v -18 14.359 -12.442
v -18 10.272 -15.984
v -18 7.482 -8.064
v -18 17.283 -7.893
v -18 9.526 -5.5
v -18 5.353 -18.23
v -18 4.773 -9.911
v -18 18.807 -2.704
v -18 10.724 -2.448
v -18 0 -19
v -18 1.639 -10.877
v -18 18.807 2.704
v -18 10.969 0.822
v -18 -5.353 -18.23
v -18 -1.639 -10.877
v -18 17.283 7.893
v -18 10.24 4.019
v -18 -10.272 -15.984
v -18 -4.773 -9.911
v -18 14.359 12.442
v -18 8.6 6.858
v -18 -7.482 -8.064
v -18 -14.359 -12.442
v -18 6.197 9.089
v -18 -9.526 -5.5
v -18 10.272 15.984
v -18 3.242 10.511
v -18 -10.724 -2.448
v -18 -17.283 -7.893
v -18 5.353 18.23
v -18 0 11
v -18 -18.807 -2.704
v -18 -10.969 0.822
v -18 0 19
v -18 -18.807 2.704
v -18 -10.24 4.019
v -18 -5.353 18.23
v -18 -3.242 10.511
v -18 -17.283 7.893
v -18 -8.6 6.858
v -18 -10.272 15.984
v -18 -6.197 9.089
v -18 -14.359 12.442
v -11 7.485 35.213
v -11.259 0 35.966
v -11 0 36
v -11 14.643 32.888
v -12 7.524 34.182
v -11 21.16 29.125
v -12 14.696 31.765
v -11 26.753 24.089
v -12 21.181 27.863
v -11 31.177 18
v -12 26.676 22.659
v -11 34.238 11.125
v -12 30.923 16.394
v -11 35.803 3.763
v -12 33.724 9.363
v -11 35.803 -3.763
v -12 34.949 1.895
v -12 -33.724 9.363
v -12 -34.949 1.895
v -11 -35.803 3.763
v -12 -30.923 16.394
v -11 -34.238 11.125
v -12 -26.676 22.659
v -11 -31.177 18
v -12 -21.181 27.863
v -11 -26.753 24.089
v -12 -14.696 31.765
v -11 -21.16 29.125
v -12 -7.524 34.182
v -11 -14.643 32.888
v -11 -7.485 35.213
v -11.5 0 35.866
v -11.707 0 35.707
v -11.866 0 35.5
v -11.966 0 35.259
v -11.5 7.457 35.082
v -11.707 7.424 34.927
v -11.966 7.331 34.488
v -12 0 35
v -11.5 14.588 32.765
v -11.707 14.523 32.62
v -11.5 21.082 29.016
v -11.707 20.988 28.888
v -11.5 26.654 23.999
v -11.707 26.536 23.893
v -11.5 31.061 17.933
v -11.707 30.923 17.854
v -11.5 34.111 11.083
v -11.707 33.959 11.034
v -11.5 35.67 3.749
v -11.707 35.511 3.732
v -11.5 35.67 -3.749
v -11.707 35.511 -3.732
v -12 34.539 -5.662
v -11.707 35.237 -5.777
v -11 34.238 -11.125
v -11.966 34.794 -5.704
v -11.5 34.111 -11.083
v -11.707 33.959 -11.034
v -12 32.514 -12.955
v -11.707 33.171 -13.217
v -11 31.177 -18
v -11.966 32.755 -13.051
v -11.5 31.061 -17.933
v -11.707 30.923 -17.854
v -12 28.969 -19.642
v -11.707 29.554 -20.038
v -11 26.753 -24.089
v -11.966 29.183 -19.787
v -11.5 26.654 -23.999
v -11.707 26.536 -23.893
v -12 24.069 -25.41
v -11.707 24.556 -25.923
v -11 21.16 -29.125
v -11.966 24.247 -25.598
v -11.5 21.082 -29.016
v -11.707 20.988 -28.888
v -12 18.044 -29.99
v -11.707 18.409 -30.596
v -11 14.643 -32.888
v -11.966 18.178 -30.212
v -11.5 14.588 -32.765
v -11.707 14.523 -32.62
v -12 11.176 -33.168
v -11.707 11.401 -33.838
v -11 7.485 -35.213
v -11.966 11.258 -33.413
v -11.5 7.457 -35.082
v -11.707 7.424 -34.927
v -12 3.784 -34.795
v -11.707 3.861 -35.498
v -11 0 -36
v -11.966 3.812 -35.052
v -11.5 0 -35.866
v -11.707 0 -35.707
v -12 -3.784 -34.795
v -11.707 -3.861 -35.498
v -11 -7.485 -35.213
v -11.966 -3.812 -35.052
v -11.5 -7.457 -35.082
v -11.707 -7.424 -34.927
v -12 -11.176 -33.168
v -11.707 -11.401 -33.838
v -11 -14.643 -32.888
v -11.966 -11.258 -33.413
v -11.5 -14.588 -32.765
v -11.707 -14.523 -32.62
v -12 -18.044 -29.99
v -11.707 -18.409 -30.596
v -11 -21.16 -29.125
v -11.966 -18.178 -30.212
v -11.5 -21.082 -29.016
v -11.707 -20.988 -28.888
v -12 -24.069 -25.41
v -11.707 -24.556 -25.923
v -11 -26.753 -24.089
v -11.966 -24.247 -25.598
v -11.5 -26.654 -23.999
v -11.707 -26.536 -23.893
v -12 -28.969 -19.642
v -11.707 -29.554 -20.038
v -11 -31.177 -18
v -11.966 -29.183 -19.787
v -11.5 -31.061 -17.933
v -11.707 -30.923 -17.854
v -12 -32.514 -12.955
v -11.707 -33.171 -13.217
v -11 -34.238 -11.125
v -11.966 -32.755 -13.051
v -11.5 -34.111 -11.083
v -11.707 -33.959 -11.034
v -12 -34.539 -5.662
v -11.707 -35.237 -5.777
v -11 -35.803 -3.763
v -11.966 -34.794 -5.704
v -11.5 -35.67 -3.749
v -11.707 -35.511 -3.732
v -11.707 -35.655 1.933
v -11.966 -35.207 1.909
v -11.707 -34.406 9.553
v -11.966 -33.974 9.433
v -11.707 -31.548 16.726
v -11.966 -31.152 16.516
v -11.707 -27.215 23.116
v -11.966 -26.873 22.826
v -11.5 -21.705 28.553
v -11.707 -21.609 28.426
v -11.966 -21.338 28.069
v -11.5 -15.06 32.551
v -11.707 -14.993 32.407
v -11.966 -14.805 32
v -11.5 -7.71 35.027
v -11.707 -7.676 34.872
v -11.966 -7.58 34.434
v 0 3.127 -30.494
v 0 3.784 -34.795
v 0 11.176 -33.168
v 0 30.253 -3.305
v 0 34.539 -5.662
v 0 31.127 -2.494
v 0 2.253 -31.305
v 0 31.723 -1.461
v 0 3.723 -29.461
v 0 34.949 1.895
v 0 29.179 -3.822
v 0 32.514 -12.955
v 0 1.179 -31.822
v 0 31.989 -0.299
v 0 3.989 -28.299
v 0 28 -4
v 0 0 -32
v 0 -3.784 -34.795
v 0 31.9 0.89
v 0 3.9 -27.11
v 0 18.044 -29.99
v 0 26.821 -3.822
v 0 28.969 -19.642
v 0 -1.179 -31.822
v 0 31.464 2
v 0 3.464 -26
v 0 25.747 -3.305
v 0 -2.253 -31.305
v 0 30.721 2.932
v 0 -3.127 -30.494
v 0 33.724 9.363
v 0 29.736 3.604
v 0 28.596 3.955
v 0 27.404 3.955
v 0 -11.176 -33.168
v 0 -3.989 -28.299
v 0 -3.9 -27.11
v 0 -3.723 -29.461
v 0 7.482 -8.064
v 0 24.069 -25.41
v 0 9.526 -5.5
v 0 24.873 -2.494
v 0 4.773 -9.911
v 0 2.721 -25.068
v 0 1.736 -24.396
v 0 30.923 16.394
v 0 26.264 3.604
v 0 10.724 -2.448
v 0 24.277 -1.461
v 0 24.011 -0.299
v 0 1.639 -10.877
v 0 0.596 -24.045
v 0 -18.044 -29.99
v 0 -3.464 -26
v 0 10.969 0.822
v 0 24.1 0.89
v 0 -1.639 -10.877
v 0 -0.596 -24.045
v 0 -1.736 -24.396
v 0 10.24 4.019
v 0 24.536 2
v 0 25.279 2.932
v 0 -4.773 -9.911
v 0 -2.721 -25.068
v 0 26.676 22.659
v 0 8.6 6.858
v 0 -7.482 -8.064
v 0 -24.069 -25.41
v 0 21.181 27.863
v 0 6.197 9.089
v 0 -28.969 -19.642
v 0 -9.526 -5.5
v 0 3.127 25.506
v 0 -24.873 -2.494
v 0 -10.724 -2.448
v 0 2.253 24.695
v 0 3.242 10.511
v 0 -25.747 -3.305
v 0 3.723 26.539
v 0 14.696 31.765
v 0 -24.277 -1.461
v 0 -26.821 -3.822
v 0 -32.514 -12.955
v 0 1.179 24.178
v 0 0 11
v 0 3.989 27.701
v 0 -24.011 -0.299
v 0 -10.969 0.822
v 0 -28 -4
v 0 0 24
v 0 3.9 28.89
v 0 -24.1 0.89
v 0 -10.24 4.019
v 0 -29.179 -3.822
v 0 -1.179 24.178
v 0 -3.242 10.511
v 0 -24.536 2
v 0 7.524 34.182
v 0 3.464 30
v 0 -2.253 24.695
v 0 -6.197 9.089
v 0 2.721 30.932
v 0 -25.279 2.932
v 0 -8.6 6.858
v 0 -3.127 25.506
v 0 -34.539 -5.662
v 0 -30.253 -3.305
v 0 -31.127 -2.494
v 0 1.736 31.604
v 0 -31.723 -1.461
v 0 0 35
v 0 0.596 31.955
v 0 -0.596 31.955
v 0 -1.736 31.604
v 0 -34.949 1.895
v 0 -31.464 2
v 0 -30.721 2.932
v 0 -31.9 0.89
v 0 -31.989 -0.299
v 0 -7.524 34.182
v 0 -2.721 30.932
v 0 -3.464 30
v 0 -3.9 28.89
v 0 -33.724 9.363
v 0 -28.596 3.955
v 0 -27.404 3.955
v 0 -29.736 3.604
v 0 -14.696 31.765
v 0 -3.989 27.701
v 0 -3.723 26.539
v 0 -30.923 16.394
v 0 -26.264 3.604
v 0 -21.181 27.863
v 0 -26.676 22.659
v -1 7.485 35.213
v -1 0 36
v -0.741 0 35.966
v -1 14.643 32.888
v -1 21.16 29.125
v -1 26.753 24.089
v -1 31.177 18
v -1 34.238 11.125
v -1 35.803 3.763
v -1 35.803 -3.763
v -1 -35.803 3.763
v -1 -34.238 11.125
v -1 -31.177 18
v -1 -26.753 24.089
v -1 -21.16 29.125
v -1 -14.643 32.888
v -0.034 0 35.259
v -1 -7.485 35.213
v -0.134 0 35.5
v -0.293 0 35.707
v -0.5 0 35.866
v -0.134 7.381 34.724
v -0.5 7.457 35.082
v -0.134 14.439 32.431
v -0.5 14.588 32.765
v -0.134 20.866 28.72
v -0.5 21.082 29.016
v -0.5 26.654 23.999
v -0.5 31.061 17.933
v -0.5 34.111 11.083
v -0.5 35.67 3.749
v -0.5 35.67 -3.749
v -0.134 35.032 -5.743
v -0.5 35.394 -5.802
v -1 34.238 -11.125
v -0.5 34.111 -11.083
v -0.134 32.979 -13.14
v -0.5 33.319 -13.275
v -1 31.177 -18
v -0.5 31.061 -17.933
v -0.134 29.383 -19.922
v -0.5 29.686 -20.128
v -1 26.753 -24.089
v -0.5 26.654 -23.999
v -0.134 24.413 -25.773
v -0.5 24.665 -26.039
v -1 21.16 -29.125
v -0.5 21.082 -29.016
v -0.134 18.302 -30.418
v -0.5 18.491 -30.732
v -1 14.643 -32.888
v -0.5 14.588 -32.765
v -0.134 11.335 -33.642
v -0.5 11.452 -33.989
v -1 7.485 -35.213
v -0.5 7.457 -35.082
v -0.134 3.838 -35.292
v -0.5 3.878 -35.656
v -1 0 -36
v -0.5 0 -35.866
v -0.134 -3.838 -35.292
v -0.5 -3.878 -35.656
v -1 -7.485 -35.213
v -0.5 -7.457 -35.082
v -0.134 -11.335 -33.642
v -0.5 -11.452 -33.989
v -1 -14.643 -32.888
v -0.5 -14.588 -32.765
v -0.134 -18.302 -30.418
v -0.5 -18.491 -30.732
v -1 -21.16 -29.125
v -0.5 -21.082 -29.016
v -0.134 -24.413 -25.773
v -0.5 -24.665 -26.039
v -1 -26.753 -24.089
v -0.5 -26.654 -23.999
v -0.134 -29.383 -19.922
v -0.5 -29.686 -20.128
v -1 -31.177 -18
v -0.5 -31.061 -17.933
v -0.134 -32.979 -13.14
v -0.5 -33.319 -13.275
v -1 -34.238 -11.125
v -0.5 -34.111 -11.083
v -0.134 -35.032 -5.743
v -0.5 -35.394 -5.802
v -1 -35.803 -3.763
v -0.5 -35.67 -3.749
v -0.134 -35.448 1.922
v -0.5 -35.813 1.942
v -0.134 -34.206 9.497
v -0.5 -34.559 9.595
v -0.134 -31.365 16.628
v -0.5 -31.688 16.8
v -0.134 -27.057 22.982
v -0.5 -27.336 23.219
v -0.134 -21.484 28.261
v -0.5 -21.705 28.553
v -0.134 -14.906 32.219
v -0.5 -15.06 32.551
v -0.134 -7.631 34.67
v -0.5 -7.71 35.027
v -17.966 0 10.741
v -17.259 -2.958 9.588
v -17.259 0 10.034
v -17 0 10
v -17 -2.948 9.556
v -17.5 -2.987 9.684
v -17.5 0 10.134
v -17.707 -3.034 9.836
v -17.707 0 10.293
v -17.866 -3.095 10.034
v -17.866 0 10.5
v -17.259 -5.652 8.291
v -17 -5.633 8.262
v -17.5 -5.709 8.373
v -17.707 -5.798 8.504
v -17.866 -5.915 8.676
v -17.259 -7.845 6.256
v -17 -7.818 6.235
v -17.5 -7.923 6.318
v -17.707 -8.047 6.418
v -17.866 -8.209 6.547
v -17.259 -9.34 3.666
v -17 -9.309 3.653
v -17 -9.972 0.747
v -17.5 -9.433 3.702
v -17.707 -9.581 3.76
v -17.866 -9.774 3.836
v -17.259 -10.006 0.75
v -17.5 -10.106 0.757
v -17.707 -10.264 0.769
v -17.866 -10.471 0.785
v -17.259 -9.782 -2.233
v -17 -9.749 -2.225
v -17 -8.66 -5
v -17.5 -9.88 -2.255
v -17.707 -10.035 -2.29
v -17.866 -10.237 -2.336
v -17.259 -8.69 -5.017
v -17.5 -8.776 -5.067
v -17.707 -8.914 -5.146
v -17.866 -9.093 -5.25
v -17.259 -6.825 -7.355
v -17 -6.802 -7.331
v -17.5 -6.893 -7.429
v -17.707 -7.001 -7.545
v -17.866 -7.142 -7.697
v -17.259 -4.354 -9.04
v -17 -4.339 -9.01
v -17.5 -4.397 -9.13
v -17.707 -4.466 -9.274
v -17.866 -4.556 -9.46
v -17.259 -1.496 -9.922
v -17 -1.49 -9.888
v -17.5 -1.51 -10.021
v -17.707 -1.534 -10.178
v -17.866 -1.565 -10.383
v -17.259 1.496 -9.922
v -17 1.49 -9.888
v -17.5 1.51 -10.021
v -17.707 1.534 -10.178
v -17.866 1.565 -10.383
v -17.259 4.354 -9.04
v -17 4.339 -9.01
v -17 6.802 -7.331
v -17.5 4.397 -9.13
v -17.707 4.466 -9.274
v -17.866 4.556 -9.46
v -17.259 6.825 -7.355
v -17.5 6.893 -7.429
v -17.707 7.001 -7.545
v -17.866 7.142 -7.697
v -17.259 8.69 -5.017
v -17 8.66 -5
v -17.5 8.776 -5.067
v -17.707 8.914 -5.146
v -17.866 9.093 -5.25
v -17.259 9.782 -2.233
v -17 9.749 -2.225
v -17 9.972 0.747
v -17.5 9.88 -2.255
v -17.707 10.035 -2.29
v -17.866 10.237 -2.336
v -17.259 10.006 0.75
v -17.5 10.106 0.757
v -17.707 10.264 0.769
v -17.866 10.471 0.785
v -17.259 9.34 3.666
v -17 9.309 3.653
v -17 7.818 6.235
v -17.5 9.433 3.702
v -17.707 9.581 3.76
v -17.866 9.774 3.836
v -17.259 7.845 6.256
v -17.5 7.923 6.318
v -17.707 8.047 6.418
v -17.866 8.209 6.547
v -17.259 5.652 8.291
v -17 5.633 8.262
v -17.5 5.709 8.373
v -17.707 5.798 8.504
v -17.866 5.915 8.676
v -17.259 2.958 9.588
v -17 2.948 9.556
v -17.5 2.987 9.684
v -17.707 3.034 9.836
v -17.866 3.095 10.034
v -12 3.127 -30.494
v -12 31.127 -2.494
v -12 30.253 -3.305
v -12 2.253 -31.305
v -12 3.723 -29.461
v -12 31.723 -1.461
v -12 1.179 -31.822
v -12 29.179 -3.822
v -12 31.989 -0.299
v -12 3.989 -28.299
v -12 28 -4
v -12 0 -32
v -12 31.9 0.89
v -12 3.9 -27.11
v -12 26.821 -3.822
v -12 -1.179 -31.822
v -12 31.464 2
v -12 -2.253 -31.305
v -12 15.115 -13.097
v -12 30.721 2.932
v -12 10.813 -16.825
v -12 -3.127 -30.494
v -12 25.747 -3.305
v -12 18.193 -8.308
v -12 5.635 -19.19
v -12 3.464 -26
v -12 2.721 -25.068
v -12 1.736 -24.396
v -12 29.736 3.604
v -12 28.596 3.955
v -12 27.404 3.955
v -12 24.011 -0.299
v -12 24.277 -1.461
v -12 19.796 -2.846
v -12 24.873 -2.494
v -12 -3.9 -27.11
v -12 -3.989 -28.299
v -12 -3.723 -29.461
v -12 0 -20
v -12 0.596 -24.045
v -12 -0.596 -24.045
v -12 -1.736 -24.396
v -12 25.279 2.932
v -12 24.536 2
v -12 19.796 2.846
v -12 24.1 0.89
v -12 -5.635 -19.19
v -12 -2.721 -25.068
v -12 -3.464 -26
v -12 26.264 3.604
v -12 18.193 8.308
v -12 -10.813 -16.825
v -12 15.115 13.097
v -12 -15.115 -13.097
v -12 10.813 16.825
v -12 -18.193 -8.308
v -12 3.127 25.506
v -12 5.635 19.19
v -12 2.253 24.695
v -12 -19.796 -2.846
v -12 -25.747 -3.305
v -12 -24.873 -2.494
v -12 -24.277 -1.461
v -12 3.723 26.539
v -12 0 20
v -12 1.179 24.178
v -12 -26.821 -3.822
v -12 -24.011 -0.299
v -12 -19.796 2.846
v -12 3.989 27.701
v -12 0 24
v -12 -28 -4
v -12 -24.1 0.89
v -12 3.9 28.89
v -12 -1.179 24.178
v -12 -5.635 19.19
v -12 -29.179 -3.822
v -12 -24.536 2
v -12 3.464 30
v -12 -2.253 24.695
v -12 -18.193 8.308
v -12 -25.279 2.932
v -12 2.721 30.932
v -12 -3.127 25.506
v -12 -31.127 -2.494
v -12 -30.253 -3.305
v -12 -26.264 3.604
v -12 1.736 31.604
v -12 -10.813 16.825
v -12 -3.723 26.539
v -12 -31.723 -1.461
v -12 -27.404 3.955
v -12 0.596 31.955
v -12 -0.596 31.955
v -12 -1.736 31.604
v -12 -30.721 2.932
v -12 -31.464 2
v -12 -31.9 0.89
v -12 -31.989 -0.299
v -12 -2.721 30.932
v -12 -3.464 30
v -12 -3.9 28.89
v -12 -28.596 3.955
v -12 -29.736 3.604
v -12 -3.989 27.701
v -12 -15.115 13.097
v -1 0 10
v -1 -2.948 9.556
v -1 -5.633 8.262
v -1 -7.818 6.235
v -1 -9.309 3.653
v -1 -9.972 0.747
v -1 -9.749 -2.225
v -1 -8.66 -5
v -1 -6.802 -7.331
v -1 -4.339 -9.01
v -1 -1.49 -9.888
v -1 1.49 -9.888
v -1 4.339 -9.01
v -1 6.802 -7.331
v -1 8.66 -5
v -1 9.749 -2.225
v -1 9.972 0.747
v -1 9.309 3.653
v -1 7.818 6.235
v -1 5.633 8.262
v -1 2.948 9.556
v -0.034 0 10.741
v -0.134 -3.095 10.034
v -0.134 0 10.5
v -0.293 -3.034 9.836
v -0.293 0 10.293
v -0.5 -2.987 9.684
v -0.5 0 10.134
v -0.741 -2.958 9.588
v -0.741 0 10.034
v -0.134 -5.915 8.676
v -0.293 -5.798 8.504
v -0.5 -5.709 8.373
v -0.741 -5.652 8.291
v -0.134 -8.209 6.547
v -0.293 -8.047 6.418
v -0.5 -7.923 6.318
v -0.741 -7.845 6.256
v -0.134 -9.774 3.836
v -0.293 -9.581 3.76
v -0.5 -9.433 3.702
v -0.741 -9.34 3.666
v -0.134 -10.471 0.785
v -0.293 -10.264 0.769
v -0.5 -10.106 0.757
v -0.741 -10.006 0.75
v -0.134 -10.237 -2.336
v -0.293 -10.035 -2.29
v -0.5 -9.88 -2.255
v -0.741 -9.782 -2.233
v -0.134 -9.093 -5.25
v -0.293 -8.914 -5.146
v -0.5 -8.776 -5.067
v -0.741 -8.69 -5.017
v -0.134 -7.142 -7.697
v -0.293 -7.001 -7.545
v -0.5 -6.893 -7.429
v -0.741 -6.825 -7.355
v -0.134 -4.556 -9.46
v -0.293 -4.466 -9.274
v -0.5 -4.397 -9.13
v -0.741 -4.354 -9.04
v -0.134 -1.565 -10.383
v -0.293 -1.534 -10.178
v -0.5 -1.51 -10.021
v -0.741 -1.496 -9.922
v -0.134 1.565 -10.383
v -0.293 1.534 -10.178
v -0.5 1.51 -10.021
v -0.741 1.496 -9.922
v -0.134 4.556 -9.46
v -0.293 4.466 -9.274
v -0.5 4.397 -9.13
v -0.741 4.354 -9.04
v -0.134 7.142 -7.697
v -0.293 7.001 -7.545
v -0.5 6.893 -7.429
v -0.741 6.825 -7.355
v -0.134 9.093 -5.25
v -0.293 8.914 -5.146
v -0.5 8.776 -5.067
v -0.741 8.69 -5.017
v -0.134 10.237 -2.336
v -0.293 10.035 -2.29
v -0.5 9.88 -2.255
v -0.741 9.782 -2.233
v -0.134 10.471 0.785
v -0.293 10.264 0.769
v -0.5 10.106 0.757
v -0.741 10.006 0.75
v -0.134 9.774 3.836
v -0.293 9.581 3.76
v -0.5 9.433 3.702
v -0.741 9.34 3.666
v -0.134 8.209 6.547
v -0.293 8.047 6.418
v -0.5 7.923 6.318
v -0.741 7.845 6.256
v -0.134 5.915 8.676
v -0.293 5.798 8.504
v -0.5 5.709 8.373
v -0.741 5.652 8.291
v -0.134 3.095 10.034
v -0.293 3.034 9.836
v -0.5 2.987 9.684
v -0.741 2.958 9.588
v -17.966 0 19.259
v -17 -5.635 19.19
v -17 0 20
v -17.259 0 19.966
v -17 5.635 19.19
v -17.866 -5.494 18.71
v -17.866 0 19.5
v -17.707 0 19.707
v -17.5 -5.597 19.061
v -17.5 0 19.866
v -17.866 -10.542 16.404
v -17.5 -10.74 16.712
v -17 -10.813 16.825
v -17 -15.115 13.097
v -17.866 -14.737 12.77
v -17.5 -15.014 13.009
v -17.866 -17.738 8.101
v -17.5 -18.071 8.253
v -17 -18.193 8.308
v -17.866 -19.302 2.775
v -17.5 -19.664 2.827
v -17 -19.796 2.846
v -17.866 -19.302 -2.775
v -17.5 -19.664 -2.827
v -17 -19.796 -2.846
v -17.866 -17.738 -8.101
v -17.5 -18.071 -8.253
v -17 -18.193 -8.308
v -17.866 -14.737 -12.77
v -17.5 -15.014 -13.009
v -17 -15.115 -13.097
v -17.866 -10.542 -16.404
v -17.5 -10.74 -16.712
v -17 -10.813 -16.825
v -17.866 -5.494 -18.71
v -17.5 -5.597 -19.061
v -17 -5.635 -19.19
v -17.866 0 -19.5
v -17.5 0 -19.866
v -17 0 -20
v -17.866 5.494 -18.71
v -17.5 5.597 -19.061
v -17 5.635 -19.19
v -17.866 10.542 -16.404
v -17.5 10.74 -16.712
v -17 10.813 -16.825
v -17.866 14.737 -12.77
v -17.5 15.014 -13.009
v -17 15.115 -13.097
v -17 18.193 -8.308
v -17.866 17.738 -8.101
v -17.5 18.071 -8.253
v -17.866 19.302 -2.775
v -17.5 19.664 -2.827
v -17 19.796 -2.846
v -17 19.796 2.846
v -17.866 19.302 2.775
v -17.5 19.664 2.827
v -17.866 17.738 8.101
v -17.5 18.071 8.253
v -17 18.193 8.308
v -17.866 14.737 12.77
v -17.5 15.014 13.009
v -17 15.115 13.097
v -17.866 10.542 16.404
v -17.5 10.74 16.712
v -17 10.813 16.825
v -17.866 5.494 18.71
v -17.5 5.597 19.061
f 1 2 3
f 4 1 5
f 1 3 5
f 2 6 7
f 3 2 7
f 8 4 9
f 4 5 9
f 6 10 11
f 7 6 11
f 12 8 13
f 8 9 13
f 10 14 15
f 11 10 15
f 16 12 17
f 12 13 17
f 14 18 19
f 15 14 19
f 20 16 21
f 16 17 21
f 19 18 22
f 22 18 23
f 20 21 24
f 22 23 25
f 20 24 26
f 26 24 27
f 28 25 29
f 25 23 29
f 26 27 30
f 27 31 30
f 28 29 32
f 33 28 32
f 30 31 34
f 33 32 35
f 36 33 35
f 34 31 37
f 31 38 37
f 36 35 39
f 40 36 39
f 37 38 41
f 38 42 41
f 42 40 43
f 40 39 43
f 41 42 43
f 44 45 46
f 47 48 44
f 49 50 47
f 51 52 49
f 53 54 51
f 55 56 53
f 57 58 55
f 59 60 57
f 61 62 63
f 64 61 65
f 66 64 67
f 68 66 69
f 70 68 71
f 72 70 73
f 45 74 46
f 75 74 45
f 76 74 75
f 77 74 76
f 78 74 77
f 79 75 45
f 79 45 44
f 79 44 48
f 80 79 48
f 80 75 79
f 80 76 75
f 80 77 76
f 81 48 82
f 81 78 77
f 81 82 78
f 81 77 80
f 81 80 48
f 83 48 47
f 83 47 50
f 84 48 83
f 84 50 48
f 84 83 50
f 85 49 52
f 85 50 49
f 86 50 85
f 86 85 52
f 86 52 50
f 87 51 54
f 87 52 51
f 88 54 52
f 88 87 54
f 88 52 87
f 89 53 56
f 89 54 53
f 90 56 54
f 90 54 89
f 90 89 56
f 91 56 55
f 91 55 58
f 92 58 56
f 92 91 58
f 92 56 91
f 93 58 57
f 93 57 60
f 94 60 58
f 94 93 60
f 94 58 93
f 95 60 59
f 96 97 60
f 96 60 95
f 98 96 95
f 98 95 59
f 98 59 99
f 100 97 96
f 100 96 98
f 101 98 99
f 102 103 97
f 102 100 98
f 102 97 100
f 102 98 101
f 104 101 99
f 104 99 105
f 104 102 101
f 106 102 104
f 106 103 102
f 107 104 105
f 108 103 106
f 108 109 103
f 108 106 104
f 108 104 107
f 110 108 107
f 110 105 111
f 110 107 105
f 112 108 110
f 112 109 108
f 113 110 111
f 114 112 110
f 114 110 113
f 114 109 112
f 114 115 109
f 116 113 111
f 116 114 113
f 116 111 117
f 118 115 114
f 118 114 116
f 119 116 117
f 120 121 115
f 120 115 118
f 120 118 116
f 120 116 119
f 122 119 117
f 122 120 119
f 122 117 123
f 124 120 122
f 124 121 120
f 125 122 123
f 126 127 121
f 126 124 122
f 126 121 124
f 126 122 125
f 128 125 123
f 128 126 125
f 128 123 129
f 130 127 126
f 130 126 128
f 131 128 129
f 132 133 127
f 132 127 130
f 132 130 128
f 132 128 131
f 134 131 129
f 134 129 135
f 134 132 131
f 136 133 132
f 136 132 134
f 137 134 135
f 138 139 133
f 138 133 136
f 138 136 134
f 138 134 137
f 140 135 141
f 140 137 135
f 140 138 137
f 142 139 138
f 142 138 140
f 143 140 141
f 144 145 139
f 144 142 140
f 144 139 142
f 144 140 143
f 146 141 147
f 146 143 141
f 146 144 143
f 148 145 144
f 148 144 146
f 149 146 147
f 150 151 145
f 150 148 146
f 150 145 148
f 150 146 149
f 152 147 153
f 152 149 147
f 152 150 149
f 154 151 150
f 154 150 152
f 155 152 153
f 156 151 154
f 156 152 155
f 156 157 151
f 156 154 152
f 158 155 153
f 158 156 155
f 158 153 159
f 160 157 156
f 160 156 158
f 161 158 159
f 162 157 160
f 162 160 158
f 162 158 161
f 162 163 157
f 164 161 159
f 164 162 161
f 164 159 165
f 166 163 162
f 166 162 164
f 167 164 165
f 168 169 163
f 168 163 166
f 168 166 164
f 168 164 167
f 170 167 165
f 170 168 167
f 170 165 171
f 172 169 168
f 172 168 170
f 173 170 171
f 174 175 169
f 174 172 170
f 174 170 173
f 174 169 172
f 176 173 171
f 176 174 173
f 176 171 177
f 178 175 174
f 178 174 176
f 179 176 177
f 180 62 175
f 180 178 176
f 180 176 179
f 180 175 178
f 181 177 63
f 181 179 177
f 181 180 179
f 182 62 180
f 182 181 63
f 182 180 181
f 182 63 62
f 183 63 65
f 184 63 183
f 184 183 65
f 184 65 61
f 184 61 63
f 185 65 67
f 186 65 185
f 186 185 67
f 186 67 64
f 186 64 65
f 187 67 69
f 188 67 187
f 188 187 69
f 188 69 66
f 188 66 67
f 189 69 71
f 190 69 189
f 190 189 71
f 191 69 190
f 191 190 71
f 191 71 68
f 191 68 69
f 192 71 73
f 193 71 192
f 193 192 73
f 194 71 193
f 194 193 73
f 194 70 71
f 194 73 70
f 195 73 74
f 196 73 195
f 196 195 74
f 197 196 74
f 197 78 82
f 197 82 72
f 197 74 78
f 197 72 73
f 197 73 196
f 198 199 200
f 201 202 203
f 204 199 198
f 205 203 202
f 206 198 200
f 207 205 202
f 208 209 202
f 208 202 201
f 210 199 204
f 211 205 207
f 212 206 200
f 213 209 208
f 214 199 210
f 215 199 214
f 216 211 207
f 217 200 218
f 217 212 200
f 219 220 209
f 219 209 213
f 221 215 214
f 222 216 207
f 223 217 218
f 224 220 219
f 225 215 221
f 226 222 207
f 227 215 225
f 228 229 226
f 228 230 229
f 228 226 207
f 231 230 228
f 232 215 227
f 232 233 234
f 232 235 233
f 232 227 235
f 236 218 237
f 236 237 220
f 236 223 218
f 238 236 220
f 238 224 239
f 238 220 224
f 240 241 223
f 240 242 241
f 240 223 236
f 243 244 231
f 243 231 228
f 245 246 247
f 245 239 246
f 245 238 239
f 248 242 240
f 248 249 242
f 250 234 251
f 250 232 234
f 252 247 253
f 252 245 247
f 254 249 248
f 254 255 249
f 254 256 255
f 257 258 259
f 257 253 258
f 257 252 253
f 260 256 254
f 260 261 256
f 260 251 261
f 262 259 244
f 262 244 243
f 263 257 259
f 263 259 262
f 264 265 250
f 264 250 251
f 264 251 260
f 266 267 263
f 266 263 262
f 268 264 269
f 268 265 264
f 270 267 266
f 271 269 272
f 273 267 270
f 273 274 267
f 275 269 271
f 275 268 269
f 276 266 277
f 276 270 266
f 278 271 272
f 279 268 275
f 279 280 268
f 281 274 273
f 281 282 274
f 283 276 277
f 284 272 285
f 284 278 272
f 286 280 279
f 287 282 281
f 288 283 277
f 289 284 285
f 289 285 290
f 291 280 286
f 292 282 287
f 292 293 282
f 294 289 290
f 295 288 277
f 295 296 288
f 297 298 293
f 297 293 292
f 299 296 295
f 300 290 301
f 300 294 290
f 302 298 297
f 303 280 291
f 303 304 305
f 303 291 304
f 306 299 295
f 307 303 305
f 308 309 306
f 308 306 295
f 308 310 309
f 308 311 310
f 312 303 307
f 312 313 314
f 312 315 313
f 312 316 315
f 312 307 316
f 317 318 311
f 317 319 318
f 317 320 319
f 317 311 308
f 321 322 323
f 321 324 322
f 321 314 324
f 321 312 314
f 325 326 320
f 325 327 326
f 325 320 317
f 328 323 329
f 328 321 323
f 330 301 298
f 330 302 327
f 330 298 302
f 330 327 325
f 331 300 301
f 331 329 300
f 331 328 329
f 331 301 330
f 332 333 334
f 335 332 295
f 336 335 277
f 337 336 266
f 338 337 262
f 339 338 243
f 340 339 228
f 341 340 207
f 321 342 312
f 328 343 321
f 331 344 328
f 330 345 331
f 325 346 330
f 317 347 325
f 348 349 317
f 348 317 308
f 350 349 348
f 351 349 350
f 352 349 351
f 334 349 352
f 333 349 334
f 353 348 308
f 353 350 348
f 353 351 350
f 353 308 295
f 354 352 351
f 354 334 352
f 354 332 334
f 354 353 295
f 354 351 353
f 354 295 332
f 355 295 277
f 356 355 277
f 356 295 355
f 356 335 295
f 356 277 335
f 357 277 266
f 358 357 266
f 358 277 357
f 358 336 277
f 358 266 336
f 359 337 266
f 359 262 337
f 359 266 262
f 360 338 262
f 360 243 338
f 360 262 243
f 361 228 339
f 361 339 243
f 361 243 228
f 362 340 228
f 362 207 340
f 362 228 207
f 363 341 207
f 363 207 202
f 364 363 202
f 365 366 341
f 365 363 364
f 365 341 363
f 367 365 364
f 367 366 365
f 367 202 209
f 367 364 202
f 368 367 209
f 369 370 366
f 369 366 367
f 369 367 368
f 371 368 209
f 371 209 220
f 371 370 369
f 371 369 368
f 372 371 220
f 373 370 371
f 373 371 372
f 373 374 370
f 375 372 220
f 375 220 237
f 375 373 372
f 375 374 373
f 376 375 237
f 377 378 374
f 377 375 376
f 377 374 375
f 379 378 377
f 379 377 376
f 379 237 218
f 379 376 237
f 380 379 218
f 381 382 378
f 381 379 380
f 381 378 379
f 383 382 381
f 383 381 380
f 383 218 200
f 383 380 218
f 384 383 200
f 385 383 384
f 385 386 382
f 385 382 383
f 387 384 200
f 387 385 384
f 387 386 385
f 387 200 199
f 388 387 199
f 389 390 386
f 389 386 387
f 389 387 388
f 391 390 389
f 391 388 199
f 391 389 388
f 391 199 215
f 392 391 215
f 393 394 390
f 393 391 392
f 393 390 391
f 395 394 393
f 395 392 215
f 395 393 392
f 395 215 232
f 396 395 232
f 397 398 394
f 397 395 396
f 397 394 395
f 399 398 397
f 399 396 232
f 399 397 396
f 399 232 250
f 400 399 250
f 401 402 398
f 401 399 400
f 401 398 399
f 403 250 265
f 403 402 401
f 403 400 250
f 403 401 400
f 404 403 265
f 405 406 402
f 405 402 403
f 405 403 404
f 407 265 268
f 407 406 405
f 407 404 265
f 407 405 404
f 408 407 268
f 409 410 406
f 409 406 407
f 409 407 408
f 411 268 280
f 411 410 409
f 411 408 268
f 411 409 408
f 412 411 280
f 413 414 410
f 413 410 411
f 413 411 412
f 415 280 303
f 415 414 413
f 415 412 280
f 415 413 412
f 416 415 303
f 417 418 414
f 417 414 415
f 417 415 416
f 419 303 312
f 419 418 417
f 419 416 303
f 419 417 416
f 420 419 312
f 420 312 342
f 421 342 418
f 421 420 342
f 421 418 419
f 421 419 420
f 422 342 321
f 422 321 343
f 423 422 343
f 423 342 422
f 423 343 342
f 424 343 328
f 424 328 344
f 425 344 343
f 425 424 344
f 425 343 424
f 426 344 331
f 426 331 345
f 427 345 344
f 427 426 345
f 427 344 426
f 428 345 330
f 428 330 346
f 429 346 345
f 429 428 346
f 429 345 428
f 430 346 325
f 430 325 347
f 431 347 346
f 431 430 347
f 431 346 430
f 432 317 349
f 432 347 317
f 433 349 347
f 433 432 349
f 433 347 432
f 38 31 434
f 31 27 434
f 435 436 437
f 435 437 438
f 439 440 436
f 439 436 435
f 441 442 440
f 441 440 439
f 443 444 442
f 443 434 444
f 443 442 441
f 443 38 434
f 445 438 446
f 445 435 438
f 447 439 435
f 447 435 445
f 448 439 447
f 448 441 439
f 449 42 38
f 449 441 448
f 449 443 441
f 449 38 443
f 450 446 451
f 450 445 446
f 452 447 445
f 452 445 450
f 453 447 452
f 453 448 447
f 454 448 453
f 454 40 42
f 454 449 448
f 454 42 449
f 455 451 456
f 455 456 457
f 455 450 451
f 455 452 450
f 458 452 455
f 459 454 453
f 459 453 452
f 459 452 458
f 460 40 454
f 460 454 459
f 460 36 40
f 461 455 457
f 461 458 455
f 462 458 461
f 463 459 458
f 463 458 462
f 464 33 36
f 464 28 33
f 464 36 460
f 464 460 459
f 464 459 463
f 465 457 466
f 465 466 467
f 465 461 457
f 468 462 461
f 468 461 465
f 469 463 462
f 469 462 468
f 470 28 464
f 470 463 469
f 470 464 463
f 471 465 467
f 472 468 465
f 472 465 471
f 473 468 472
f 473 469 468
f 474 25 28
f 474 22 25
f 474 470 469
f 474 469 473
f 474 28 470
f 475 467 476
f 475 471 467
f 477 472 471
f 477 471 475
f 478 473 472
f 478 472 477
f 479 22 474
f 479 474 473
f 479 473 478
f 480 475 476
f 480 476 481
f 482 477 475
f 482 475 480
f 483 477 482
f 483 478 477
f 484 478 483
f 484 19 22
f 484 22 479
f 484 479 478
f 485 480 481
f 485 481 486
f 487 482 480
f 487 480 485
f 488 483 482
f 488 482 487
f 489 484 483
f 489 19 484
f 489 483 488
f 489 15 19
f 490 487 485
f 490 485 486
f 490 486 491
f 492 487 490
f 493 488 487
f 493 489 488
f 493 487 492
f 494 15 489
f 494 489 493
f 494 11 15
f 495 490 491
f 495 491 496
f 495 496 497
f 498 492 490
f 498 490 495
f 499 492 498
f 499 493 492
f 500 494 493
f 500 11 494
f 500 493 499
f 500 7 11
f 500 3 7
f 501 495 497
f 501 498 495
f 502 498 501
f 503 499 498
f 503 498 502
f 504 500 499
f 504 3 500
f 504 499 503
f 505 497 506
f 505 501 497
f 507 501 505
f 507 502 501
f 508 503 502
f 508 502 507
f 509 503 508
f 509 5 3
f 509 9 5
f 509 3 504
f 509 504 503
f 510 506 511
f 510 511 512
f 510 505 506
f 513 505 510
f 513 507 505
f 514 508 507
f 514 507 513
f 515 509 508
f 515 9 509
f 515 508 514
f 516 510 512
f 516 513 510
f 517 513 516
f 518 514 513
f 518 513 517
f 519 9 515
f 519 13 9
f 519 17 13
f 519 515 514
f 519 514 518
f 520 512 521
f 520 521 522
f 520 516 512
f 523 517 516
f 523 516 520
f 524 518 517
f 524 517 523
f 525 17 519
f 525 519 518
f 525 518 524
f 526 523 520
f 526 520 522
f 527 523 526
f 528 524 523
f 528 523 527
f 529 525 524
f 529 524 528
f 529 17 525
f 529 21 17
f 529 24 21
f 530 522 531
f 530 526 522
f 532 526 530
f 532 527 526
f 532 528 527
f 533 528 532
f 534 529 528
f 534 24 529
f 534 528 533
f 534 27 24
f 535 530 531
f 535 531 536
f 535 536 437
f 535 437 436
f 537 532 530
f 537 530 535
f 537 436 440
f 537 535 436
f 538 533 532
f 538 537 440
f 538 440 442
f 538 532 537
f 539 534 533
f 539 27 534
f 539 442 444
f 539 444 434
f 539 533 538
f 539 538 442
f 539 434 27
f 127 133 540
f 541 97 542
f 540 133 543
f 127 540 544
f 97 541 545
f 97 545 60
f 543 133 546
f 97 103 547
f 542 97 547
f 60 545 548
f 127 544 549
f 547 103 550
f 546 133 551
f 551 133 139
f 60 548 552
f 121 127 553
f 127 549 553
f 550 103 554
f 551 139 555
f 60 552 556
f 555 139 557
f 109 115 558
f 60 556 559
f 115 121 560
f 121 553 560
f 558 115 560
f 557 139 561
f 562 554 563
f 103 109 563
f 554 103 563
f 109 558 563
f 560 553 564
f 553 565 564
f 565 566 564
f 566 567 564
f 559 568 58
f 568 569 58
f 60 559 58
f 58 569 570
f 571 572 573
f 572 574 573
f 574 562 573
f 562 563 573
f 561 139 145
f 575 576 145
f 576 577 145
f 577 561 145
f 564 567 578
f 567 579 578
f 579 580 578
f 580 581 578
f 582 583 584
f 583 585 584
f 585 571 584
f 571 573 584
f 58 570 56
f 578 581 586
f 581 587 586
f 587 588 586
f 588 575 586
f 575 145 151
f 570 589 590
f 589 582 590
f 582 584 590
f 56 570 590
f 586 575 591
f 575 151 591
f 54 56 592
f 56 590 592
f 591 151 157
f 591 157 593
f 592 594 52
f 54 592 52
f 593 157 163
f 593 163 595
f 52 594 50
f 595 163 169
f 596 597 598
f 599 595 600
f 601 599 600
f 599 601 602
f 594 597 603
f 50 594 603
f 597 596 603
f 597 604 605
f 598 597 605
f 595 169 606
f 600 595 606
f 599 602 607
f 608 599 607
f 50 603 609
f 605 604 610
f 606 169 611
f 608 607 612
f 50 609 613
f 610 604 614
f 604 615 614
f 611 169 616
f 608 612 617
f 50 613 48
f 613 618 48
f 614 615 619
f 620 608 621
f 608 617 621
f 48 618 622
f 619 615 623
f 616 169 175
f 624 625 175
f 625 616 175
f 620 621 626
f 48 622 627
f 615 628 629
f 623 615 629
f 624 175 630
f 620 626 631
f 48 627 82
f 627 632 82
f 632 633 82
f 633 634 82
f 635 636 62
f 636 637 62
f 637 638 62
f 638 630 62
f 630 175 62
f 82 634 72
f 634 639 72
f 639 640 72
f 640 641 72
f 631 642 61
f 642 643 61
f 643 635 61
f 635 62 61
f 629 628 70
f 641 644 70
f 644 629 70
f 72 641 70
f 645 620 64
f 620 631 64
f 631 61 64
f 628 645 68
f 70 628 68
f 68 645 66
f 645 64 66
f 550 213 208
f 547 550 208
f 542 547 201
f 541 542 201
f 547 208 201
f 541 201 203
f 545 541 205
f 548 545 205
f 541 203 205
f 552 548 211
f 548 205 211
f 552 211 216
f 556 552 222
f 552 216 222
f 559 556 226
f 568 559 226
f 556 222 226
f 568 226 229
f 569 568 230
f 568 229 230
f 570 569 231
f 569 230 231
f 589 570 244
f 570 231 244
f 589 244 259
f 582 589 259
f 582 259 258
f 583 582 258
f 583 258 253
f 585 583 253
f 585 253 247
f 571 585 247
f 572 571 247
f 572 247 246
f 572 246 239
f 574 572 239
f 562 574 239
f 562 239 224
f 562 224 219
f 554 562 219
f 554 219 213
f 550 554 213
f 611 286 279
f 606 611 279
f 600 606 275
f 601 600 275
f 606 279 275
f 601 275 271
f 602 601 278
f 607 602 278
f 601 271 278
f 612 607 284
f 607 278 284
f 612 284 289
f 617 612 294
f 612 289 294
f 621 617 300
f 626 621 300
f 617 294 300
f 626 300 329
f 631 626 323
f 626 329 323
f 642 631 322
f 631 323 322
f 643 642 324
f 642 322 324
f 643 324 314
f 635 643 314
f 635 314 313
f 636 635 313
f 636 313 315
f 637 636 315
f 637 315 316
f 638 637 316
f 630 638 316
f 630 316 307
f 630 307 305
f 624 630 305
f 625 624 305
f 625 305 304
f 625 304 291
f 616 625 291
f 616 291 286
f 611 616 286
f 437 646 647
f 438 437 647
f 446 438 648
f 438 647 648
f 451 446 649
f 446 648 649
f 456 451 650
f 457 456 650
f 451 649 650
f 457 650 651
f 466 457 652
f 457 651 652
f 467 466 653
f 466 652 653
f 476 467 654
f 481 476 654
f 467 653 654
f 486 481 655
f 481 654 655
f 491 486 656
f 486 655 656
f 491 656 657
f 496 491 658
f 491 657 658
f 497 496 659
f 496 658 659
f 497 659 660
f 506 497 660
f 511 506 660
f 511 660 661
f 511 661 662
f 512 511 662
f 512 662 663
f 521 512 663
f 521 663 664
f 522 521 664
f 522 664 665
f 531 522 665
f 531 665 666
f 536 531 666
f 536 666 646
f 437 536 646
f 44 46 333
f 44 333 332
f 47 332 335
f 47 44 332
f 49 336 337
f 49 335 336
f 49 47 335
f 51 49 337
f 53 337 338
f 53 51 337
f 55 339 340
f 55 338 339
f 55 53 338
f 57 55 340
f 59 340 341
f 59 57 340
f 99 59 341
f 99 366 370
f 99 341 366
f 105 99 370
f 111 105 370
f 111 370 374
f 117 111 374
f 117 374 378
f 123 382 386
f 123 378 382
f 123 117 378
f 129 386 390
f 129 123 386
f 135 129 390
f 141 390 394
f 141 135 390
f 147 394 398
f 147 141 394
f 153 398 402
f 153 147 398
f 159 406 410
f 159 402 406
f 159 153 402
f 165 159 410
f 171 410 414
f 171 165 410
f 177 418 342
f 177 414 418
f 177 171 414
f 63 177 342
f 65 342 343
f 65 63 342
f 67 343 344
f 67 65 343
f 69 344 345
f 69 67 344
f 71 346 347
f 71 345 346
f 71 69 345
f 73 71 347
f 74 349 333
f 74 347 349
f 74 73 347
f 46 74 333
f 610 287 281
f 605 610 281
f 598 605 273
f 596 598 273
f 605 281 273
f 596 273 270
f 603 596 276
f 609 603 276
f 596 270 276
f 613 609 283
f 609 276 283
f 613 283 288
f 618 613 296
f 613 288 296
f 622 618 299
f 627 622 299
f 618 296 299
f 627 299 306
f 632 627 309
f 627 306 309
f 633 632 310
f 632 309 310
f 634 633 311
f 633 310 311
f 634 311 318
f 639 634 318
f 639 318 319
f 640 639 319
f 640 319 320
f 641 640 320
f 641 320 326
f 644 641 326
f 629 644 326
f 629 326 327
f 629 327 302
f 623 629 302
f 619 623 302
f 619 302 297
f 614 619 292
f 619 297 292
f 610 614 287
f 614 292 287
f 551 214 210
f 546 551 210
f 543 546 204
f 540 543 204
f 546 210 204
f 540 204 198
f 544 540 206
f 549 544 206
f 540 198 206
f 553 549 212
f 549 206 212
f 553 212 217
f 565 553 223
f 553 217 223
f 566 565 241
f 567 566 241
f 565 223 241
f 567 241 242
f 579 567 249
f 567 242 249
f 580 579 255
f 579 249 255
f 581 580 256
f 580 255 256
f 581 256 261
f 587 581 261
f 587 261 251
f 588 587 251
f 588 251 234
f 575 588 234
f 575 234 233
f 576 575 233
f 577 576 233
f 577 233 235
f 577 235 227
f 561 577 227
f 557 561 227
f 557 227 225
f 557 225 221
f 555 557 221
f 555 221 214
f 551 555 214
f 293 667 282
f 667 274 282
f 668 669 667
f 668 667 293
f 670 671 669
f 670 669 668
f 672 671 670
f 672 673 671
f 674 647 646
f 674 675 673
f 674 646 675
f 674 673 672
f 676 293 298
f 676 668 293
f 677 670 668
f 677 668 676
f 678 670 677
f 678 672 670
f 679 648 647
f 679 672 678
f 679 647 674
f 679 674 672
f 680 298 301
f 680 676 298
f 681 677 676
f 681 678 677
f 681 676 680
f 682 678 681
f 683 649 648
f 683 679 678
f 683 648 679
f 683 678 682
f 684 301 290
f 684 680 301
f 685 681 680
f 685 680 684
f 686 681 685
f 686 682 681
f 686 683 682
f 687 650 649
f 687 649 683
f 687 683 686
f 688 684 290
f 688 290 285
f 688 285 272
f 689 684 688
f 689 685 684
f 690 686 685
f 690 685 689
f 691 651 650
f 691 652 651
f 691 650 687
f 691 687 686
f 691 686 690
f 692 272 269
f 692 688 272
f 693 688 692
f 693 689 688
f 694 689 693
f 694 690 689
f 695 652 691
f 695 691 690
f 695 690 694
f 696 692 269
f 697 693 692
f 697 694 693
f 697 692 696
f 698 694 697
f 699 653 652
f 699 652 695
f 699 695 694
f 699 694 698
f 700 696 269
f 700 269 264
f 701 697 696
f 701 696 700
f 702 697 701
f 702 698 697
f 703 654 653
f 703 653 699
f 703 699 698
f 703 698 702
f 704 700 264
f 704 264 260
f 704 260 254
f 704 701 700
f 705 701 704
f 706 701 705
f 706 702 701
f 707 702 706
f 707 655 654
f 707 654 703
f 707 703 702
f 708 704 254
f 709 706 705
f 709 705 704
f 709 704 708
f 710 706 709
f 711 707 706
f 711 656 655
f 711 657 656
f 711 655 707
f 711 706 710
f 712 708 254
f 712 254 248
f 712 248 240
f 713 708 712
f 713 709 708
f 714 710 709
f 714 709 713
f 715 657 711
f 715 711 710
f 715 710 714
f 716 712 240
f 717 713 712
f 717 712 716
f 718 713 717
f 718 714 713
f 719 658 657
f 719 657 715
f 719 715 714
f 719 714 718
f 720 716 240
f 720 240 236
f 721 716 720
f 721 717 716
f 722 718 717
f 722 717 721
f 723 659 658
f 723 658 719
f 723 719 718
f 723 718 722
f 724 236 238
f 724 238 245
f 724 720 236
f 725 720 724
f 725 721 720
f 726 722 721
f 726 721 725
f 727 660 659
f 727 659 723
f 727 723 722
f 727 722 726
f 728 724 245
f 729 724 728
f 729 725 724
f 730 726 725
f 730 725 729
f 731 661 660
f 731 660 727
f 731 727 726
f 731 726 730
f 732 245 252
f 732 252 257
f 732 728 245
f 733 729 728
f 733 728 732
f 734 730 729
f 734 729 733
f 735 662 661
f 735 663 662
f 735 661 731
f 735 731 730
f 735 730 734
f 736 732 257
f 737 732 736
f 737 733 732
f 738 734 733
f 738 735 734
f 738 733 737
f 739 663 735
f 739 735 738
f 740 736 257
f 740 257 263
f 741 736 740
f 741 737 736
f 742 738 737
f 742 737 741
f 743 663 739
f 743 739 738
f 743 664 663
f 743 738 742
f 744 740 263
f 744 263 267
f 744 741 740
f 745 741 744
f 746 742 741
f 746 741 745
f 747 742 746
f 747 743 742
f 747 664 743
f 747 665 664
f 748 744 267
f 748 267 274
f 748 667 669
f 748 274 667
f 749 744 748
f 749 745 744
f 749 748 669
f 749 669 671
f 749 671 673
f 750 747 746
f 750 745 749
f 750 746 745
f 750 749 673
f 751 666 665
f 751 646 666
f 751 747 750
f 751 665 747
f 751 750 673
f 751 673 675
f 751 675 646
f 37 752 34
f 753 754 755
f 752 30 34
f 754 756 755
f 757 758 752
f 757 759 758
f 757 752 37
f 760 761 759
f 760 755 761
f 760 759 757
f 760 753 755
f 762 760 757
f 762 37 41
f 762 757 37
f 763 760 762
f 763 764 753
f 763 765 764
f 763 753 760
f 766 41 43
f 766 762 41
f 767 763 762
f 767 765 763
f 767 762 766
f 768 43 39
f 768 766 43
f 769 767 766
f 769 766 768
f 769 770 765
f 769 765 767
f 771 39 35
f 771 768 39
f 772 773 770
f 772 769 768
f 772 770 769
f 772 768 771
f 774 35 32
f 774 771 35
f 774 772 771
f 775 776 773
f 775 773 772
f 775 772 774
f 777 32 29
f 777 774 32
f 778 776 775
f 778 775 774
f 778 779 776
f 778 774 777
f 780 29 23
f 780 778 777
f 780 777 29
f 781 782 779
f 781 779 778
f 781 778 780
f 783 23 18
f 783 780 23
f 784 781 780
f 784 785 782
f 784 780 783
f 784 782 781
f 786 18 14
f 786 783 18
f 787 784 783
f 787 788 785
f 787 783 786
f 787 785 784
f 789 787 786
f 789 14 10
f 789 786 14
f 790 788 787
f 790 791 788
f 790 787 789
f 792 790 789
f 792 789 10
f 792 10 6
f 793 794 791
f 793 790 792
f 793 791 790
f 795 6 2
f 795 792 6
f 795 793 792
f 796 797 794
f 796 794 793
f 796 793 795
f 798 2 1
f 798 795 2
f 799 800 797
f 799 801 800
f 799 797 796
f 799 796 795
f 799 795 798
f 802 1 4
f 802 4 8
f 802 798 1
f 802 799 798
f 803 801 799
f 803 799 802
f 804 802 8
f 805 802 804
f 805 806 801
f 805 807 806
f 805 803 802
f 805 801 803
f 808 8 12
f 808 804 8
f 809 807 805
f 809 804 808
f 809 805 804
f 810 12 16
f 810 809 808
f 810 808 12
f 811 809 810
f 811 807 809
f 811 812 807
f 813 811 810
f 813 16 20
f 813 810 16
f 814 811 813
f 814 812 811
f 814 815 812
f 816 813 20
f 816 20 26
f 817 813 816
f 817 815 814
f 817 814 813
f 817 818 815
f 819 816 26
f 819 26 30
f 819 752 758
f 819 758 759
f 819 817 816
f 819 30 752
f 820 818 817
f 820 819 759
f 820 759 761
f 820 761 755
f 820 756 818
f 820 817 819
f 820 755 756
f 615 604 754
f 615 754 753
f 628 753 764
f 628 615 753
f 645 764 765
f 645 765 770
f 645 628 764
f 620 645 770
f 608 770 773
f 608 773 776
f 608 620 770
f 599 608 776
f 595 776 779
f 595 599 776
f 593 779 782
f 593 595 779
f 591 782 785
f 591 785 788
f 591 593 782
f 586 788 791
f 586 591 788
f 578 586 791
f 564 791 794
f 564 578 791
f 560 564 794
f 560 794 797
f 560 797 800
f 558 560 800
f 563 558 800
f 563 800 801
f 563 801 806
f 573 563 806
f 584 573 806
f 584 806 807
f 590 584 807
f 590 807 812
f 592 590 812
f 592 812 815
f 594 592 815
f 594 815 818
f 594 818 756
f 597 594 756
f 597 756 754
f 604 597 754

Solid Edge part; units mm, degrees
sketch "Sketch1" plane through (0, 0, 0) normal (0, -1, 0) x (1, 0, 0)
  line L0 (0, 10) -> (0, 36)
  line L1 (0, 36) -> (-12, 36)
  line L2 (-12, 20) -> (-12, 36)
  line L3 (-18, 20) -> (-12, 20)
  line L4 (-18, 10) -> (-18, 20)
  line L5 (-18, 10) -> (0, 10)
revolve "RevolvedProtrusion1" add sketch "Sketch1" angle 360 about axis through (-60, 0, 0) along (1, 0, 0)
sketch "Sketch2" plane through (0, 0, 0) normal (1, 0, 0) x (0, 0, -1)
  circle A0 centre (0, 28) radius 4
  circle A1 centre (-28, 0) radius 4
  circle A2 centre (0, -28) radius 4
  circle A3 centre (28, 0) radius 4
extrude "Cutout1" cut sketch "Sketch2" against normal blind 30
fillet "Round_1" radius 1 5 edges at (0, 0, -36) (-12, 0, -36) (-18, 0, -20) (-18, 0, -10) (0, 0, -10)
